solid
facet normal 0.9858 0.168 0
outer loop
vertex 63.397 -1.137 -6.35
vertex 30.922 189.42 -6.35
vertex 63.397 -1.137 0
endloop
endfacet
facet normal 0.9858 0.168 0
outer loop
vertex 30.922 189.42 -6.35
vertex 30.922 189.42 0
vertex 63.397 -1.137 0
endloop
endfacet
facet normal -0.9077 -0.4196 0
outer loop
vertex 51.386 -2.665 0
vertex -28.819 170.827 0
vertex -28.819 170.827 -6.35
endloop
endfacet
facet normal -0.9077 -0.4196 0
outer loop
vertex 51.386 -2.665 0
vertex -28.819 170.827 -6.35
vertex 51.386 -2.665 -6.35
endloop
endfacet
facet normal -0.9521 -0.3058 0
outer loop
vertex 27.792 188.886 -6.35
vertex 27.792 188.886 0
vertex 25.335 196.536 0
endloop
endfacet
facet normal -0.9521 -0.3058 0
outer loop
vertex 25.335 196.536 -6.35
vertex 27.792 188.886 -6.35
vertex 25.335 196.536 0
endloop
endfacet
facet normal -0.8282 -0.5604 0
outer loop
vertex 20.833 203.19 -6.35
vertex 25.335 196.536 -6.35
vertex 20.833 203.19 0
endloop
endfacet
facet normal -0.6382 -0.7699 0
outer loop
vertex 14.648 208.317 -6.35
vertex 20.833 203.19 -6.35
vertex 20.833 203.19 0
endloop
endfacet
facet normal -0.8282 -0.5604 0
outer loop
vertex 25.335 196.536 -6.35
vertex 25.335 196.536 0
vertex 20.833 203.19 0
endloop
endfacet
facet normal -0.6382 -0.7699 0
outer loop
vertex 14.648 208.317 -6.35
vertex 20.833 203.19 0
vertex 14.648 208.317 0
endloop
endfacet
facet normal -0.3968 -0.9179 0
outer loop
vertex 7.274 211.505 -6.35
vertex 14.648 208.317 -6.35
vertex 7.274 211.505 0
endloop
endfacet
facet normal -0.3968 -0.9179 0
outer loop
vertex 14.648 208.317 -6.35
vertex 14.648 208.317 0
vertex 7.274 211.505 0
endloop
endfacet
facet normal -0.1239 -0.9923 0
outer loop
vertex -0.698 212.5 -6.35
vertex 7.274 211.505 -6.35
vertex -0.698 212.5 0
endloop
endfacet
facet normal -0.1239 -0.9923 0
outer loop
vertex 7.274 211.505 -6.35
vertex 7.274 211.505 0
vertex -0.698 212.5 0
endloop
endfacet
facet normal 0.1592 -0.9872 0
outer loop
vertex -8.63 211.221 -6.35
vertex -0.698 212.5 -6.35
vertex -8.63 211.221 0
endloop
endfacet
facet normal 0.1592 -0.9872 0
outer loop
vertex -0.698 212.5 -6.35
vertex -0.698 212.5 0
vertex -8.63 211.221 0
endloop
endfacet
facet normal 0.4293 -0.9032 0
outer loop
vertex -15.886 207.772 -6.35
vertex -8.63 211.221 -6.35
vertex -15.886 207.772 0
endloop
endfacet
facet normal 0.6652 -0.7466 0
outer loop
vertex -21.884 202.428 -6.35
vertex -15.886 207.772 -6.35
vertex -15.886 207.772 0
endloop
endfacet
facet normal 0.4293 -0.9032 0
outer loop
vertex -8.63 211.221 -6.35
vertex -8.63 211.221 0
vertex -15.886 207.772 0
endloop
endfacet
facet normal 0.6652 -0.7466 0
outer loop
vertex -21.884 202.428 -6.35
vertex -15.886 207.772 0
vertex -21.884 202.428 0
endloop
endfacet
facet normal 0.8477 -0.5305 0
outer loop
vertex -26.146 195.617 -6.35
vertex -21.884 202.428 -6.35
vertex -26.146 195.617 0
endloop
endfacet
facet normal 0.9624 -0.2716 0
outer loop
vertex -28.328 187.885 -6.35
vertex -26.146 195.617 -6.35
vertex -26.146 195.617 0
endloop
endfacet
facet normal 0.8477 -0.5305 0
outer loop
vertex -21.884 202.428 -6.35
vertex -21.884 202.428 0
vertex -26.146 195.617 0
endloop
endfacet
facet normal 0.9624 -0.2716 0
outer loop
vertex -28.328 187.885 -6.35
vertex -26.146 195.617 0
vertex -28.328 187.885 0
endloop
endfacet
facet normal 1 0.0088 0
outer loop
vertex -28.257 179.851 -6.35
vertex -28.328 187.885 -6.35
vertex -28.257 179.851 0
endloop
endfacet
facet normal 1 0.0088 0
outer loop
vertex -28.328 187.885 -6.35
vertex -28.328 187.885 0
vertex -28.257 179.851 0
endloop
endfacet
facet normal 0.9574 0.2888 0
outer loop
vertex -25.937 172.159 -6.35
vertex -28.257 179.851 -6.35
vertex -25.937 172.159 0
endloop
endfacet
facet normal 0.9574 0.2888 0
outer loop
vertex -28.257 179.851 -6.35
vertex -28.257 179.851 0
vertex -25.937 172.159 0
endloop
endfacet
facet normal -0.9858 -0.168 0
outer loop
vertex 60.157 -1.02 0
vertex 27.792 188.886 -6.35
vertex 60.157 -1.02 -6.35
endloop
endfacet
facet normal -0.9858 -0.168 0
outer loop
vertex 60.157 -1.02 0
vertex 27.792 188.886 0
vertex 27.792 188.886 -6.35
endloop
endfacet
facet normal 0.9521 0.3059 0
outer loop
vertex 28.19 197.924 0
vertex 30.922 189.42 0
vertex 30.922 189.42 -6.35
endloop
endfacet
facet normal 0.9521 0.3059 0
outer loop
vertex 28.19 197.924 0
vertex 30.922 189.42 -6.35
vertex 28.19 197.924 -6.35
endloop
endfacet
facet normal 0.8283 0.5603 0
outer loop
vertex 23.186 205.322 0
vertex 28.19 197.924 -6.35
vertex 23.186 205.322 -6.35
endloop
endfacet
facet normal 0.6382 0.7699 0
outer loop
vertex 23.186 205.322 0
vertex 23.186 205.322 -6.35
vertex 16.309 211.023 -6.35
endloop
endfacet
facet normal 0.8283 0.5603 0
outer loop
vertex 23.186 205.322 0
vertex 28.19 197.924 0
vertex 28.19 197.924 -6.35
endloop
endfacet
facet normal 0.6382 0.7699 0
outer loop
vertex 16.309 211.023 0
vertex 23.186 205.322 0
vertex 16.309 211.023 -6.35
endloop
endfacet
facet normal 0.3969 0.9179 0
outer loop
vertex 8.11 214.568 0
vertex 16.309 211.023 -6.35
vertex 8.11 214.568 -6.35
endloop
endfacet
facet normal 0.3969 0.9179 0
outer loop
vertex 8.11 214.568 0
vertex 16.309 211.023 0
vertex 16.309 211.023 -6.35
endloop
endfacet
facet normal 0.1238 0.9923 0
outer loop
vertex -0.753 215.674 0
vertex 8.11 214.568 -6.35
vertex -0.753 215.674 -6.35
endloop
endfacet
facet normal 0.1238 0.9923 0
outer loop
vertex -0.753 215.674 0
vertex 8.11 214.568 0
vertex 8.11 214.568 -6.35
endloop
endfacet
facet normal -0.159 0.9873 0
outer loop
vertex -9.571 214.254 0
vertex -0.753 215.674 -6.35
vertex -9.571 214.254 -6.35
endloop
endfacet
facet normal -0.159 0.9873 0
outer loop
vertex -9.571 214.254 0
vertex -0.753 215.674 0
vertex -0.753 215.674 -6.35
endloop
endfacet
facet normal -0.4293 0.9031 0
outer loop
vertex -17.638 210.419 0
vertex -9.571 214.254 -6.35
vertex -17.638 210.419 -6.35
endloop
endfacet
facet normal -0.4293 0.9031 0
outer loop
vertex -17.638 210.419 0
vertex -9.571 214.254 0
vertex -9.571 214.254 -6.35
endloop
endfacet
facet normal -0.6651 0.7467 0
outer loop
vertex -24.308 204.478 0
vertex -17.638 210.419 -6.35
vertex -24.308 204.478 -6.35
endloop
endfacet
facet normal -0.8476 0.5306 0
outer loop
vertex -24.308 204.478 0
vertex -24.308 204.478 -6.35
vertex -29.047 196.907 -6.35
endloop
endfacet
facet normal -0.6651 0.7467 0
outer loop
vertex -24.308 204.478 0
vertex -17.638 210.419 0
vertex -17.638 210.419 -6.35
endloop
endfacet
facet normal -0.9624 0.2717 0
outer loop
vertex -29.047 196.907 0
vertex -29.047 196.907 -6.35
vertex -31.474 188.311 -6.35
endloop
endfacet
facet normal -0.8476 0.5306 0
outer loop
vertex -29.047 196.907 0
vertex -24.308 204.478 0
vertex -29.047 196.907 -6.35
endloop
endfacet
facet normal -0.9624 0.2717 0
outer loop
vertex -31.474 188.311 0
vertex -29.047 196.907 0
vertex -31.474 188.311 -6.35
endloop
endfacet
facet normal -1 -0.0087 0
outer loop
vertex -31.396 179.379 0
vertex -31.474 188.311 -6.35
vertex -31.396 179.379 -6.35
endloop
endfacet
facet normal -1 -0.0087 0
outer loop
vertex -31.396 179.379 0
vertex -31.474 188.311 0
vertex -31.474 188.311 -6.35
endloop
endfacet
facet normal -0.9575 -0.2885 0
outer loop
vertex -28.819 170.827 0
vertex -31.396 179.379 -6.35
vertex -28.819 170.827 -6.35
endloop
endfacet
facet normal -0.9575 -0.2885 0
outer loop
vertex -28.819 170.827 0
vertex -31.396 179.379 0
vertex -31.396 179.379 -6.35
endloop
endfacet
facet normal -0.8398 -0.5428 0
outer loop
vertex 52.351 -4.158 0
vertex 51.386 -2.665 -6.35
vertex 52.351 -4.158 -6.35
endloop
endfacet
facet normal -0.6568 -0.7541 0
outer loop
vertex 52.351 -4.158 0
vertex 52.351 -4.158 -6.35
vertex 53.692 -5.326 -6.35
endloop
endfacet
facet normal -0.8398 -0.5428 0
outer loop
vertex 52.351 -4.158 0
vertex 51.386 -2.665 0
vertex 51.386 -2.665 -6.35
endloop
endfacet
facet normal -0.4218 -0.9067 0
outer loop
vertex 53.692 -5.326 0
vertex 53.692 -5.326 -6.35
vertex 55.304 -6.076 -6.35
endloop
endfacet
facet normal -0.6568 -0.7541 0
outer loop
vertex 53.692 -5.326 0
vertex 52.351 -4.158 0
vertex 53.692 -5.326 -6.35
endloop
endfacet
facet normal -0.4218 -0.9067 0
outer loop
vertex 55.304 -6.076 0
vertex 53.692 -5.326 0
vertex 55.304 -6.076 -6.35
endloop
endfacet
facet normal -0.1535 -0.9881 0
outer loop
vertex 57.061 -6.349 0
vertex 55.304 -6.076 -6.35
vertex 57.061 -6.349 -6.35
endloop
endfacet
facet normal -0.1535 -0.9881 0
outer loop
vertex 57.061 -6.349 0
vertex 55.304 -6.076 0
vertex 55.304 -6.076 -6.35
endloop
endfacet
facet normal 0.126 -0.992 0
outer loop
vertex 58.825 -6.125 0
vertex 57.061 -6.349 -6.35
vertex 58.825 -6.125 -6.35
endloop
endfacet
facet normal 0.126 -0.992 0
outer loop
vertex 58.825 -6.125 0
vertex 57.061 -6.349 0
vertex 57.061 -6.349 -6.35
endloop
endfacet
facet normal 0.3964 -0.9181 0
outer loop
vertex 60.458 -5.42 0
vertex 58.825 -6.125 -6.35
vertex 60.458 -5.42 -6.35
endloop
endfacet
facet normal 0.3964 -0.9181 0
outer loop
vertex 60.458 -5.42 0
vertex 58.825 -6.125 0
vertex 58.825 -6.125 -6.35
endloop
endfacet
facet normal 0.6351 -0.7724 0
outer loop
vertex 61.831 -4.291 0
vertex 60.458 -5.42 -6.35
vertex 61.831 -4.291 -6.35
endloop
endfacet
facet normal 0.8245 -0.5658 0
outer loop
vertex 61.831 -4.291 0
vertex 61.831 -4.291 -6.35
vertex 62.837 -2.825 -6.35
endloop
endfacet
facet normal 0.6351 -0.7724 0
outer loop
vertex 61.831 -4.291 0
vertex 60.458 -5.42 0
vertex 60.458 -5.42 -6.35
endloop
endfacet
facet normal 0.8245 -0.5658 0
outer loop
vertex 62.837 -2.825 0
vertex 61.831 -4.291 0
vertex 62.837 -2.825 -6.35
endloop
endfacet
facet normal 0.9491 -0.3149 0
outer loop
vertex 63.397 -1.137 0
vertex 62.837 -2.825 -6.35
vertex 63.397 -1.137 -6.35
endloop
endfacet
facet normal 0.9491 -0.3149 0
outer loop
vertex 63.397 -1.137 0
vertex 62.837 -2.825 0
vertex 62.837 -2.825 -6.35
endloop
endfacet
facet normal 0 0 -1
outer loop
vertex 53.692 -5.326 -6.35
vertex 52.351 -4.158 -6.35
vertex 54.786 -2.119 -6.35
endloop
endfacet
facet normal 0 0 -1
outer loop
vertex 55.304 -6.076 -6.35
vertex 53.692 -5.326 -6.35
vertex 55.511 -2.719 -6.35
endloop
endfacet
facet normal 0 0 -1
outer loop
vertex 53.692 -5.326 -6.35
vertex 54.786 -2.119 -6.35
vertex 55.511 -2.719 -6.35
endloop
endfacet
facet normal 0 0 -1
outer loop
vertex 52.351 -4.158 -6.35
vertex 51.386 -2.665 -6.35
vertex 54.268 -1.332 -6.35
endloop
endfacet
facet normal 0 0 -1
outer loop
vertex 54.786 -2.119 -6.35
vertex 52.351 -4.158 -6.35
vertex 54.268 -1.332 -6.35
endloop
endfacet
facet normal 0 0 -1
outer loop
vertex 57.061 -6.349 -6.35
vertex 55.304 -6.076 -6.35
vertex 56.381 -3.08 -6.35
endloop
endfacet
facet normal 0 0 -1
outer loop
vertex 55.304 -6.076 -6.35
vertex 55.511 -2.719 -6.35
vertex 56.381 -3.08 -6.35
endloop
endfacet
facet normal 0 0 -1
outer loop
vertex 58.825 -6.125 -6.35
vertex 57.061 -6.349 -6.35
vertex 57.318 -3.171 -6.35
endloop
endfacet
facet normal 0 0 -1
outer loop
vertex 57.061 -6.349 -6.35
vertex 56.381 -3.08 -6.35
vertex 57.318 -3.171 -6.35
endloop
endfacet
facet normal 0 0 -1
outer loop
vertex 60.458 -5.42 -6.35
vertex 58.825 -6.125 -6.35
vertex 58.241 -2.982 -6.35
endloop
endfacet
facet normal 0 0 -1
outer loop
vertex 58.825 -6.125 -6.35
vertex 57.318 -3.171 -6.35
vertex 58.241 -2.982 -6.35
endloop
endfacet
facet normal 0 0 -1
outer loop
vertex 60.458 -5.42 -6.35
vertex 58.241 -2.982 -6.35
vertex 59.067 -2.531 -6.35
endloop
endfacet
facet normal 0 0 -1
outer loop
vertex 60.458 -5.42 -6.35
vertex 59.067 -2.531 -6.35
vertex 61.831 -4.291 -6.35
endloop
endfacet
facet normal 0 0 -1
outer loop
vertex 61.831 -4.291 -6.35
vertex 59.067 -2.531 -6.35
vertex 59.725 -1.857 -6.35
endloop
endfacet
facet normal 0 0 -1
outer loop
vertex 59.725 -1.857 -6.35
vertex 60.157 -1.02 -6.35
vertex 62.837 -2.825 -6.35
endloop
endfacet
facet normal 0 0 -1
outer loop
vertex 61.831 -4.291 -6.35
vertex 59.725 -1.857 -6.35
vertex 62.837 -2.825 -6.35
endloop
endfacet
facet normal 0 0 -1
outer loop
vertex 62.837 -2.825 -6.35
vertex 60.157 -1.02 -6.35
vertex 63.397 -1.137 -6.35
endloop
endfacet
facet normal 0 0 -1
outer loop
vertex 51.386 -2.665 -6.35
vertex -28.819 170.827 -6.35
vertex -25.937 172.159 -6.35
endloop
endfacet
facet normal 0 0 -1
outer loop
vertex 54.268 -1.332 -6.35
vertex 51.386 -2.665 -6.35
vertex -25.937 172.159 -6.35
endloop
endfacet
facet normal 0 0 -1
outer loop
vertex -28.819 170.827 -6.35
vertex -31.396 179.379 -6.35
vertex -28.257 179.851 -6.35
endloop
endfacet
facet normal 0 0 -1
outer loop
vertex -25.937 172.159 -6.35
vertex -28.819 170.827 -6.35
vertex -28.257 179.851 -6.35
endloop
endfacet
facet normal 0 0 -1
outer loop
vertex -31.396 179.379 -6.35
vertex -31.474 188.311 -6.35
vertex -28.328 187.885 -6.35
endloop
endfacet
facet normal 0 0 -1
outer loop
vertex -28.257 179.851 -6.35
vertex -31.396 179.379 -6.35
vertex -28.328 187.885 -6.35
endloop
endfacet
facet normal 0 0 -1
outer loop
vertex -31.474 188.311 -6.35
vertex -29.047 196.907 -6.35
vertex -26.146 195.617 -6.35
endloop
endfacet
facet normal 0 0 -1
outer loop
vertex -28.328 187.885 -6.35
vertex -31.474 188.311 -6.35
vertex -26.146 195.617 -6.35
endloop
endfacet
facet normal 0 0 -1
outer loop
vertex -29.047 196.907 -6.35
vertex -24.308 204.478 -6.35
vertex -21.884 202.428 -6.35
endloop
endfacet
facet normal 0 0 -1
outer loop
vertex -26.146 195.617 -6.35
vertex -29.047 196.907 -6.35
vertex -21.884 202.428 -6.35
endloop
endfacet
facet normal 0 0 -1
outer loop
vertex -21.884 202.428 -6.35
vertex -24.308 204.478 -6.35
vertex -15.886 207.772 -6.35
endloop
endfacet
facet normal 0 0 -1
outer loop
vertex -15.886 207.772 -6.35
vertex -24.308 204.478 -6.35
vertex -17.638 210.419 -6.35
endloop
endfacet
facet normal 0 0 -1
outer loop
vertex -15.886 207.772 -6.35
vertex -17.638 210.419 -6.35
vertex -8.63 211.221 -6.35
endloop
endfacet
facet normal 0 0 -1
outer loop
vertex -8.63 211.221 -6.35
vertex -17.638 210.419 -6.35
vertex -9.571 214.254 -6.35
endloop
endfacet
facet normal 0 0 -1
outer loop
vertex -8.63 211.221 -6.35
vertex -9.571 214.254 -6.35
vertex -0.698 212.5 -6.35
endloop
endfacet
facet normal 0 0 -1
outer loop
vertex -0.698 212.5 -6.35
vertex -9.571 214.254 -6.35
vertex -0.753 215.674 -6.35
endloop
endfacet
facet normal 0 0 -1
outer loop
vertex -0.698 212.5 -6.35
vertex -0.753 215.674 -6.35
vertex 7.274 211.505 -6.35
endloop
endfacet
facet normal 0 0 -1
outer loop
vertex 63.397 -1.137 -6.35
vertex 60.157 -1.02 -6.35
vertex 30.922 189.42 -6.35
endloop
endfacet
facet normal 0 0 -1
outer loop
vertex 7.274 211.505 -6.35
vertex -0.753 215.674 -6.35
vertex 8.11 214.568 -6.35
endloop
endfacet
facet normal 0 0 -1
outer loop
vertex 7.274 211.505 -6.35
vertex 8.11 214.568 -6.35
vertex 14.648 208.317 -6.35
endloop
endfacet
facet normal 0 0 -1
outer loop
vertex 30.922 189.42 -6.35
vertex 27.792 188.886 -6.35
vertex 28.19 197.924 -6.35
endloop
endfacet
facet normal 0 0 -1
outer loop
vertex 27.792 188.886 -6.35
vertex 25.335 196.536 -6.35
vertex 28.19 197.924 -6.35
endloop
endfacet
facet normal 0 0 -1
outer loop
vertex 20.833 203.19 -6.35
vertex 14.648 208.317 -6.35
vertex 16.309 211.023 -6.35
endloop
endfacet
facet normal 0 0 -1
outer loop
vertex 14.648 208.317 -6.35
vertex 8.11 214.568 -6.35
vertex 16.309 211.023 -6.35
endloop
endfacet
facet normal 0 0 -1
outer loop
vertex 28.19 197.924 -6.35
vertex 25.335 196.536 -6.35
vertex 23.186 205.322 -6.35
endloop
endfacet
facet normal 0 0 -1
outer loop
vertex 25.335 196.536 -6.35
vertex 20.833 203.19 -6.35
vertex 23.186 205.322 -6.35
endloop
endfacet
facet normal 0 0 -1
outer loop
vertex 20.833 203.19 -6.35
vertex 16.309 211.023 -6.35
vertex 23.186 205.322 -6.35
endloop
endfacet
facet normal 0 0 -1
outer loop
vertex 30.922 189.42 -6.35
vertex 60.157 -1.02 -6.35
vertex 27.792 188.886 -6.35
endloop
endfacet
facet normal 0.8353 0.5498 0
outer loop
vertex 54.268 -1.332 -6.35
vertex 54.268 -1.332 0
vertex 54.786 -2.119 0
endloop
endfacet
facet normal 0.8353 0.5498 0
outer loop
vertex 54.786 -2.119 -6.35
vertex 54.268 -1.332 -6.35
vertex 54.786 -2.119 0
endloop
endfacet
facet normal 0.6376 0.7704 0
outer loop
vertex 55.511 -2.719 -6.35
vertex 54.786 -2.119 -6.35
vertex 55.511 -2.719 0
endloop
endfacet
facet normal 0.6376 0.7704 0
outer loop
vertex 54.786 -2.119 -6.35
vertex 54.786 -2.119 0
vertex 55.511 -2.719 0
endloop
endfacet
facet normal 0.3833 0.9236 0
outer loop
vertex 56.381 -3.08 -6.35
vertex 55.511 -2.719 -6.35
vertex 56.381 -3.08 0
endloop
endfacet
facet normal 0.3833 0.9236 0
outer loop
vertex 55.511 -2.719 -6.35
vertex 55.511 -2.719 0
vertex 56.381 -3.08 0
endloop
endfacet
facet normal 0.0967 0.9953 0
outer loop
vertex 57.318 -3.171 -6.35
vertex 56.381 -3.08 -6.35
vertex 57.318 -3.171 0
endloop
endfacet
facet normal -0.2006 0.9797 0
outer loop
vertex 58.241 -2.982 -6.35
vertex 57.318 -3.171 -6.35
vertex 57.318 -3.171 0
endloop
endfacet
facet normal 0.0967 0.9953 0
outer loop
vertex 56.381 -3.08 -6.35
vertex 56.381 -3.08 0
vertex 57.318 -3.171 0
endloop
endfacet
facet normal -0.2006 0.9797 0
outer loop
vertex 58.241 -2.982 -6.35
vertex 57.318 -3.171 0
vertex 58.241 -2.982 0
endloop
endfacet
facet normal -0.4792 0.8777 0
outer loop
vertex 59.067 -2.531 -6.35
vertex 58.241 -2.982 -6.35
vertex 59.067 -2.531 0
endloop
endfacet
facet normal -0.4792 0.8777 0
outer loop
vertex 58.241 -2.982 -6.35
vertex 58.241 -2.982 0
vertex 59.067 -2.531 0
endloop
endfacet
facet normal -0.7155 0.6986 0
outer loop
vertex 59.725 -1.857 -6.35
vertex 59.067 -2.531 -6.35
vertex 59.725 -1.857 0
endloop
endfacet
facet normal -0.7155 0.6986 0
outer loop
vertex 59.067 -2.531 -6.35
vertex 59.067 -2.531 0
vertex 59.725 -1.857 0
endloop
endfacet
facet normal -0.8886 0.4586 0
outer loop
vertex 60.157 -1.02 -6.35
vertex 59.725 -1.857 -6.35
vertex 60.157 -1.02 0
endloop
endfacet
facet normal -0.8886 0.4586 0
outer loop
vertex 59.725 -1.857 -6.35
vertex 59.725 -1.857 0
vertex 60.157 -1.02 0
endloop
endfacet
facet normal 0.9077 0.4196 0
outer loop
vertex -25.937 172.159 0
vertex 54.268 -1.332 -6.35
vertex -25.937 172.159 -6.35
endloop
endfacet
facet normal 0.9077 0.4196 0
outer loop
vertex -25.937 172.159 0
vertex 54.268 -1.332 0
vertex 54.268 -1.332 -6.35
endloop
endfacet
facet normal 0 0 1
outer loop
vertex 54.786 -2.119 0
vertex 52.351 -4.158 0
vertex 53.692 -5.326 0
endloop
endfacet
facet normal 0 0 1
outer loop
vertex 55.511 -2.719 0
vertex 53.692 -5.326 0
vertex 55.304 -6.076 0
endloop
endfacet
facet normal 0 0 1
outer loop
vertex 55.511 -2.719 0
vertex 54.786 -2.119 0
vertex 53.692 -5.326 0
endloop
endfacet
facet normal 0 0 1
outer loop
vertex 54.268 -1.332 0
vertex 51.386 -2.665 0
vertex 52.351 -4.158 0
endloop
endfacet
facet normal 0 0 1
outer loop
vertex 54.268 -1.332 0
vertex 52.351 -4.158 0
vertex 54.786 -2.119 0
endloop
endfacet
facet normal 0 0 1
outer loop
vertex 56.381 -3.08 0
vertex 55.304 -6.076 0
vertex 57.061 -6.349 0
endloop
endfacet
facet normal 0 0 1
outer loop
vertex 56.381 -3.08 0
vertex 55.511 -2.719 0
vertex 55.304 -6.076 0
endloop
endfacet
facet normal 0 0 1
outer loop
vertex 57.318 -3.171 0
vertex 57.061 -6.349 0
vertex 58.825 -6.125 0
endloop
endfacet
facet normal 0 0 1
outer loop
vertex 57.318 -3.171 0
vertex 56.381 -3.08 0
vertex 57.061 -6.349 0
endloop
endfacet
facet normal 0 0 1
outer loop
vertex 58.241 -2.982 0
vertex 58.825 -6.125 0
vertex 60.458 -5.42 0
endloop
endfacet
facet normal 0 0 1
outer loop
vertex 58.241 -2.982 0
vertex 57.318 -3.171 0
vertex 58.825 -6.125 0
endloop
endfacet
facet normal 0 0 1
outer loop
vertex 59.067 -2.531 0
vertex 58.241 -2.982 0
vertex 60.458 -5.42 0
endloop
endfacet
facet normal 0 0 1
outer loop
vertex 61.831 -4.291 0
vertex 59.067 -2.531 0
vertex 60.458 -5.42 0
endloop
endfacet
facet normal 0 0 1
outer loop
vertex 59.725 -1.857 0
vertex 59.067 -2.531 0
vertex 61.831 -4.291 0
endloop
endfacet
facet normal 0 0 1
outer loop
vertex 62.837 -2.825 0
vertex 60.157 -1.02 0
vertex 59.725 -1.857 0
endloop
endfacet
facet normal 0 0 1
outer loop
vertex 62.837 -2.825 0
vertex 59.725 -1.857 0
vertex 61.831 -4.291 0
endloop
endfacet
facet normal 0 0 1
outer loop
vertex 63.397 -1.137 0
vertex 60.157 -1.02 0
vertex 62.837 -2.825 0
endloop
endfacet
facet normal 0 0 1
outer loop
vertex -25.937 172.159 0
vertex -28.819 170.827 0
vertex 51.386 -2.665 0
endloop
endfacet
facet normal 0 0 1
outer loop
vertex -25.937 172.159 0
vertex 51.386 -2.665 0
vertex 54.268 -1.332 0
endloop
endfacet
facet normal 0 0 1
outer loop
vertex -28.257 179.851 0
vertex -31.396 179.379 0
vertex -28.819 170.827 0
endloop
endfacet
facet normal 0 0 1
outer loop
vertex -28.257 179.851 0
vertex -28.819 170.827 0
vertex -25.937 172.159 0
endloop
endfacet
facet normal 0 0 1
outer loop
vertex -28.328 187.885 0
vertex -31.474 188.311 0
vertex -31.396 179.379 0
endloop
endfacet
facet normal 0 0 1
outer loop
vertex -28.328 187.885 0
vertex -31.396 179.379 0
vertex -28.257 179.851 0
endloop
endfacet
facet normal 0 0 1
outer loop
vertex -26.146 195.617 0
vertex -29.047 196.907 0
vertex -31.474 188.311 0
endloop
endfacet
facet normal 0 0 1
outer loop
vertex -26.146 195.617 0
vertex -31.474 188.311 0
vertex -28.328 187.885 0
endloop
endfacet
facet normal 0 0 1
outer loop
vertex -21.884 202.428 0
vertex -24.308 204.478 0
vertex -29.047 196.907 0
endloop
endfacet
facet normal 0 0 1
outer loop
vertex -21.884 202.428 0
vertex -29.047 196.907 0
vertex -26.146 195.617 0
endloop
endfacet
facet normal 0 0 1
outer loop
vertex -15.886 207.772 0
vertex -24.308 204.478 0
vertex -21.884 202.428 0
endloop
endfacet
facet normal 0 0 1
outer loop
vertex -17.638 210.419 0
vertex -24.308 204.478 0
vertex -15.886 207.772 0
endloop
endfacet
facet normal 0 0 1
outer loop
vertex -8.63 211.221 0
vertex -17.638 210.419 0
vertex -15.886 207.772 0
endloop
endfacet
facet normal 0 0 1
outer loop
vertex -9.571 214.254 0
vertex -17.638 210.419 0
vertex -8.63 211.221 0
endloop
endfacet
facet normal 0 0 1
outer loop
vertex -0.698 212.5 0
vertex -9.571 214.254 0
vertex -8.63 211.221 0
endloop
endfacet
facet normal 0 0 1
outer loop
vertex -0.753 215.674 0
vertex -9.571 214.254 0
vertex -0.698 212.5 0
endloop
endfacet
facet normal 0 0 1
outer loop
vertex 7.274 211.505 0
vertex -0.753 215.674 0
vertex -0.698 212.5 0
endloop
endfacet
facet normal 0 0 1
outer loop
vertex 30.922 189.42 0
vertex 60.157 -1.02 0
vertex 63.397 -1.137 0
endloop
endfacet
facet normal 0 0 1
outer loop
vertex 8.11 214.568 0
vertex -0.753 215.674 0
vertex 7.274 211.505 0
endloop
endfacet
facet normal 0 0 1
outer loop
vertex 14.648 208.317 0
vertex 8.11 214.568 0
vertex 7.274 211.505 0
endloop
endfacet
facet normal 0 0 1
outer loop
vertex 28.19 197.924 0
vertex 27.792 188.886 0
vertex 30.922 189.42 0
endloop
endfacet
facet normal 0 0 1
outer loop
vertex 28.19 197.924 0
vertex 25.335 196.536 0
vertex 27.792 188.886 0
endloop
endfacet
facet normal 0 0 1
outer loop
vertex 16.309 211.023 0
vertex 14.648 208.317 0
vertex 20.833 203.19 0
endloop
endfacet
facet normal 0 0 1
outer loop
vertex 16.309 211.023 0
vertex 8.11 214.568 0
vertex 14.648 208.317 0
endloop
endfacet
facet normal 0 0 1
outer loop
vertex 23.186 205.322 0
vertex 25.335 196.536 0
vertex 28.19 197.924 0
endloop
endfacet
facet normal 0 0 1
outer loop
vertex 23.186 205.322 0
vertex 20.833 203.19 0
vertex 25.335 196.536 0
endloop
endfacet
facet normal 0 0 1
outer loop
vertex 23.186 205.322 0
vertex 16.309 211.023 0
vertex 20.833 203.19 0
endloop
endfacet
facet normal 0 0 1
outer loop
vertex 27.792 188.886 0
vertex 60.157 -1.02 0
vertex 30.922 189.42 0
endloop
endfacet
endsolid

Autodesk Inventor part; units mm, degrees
ref_plane "YZ Plane" through (0, 0, 0) normal (1, 0, 0) x (0, 1, 0)
ref_plane "XZ Plane" through (0, 0, 0) normal (0, 1, 0) x (-1, 0, 0)
ref_plane "XY Plane" through (0, 0, 0) normal (0, 0, 1) x (1, 0, 0)
sketch "Sketch1" plane through (0, 0, 0) normal (0, 0, 1) x (1, 0, 0)
  line L0 (30.9216, 189.4198) -> (63.3973, -1.1372)
  line L1 (-28.8193, 170.8268) -> (51.3861, -2.6646)
  line L2 (27.7918, 188.8864) -> (60.1566, -1.0202)
  line L3 (54.2681, -1.3323) -> (-25.9374, 172.1591)
  arc A0 (54.2681, -1.3323) -> (60.1566, -1.0202) centre (57.15, 0) ccw
  arc A1 (51.3861, -2.6646) -> (63.3973, -1.1372) centre (57.15, 0) ccw
  arc A2 (27.7918, 188.8864) -> (-25.9374, 172.1591) centre (-0.1919, 184.1173) ccw
  arc A3 (30.9216, 189.4198) -> (-28.8193, 170.8268) centre (-0.1919, 184.1173) ccw
  point P0 (0, 0)
  point P1 (-0.3472, 183.9895)
  dimension "d4" = 3.175
extrude "Extrusion1" add sketch "Sketch1" against normal blind 6.35
properties part number "proxy chain 1"
